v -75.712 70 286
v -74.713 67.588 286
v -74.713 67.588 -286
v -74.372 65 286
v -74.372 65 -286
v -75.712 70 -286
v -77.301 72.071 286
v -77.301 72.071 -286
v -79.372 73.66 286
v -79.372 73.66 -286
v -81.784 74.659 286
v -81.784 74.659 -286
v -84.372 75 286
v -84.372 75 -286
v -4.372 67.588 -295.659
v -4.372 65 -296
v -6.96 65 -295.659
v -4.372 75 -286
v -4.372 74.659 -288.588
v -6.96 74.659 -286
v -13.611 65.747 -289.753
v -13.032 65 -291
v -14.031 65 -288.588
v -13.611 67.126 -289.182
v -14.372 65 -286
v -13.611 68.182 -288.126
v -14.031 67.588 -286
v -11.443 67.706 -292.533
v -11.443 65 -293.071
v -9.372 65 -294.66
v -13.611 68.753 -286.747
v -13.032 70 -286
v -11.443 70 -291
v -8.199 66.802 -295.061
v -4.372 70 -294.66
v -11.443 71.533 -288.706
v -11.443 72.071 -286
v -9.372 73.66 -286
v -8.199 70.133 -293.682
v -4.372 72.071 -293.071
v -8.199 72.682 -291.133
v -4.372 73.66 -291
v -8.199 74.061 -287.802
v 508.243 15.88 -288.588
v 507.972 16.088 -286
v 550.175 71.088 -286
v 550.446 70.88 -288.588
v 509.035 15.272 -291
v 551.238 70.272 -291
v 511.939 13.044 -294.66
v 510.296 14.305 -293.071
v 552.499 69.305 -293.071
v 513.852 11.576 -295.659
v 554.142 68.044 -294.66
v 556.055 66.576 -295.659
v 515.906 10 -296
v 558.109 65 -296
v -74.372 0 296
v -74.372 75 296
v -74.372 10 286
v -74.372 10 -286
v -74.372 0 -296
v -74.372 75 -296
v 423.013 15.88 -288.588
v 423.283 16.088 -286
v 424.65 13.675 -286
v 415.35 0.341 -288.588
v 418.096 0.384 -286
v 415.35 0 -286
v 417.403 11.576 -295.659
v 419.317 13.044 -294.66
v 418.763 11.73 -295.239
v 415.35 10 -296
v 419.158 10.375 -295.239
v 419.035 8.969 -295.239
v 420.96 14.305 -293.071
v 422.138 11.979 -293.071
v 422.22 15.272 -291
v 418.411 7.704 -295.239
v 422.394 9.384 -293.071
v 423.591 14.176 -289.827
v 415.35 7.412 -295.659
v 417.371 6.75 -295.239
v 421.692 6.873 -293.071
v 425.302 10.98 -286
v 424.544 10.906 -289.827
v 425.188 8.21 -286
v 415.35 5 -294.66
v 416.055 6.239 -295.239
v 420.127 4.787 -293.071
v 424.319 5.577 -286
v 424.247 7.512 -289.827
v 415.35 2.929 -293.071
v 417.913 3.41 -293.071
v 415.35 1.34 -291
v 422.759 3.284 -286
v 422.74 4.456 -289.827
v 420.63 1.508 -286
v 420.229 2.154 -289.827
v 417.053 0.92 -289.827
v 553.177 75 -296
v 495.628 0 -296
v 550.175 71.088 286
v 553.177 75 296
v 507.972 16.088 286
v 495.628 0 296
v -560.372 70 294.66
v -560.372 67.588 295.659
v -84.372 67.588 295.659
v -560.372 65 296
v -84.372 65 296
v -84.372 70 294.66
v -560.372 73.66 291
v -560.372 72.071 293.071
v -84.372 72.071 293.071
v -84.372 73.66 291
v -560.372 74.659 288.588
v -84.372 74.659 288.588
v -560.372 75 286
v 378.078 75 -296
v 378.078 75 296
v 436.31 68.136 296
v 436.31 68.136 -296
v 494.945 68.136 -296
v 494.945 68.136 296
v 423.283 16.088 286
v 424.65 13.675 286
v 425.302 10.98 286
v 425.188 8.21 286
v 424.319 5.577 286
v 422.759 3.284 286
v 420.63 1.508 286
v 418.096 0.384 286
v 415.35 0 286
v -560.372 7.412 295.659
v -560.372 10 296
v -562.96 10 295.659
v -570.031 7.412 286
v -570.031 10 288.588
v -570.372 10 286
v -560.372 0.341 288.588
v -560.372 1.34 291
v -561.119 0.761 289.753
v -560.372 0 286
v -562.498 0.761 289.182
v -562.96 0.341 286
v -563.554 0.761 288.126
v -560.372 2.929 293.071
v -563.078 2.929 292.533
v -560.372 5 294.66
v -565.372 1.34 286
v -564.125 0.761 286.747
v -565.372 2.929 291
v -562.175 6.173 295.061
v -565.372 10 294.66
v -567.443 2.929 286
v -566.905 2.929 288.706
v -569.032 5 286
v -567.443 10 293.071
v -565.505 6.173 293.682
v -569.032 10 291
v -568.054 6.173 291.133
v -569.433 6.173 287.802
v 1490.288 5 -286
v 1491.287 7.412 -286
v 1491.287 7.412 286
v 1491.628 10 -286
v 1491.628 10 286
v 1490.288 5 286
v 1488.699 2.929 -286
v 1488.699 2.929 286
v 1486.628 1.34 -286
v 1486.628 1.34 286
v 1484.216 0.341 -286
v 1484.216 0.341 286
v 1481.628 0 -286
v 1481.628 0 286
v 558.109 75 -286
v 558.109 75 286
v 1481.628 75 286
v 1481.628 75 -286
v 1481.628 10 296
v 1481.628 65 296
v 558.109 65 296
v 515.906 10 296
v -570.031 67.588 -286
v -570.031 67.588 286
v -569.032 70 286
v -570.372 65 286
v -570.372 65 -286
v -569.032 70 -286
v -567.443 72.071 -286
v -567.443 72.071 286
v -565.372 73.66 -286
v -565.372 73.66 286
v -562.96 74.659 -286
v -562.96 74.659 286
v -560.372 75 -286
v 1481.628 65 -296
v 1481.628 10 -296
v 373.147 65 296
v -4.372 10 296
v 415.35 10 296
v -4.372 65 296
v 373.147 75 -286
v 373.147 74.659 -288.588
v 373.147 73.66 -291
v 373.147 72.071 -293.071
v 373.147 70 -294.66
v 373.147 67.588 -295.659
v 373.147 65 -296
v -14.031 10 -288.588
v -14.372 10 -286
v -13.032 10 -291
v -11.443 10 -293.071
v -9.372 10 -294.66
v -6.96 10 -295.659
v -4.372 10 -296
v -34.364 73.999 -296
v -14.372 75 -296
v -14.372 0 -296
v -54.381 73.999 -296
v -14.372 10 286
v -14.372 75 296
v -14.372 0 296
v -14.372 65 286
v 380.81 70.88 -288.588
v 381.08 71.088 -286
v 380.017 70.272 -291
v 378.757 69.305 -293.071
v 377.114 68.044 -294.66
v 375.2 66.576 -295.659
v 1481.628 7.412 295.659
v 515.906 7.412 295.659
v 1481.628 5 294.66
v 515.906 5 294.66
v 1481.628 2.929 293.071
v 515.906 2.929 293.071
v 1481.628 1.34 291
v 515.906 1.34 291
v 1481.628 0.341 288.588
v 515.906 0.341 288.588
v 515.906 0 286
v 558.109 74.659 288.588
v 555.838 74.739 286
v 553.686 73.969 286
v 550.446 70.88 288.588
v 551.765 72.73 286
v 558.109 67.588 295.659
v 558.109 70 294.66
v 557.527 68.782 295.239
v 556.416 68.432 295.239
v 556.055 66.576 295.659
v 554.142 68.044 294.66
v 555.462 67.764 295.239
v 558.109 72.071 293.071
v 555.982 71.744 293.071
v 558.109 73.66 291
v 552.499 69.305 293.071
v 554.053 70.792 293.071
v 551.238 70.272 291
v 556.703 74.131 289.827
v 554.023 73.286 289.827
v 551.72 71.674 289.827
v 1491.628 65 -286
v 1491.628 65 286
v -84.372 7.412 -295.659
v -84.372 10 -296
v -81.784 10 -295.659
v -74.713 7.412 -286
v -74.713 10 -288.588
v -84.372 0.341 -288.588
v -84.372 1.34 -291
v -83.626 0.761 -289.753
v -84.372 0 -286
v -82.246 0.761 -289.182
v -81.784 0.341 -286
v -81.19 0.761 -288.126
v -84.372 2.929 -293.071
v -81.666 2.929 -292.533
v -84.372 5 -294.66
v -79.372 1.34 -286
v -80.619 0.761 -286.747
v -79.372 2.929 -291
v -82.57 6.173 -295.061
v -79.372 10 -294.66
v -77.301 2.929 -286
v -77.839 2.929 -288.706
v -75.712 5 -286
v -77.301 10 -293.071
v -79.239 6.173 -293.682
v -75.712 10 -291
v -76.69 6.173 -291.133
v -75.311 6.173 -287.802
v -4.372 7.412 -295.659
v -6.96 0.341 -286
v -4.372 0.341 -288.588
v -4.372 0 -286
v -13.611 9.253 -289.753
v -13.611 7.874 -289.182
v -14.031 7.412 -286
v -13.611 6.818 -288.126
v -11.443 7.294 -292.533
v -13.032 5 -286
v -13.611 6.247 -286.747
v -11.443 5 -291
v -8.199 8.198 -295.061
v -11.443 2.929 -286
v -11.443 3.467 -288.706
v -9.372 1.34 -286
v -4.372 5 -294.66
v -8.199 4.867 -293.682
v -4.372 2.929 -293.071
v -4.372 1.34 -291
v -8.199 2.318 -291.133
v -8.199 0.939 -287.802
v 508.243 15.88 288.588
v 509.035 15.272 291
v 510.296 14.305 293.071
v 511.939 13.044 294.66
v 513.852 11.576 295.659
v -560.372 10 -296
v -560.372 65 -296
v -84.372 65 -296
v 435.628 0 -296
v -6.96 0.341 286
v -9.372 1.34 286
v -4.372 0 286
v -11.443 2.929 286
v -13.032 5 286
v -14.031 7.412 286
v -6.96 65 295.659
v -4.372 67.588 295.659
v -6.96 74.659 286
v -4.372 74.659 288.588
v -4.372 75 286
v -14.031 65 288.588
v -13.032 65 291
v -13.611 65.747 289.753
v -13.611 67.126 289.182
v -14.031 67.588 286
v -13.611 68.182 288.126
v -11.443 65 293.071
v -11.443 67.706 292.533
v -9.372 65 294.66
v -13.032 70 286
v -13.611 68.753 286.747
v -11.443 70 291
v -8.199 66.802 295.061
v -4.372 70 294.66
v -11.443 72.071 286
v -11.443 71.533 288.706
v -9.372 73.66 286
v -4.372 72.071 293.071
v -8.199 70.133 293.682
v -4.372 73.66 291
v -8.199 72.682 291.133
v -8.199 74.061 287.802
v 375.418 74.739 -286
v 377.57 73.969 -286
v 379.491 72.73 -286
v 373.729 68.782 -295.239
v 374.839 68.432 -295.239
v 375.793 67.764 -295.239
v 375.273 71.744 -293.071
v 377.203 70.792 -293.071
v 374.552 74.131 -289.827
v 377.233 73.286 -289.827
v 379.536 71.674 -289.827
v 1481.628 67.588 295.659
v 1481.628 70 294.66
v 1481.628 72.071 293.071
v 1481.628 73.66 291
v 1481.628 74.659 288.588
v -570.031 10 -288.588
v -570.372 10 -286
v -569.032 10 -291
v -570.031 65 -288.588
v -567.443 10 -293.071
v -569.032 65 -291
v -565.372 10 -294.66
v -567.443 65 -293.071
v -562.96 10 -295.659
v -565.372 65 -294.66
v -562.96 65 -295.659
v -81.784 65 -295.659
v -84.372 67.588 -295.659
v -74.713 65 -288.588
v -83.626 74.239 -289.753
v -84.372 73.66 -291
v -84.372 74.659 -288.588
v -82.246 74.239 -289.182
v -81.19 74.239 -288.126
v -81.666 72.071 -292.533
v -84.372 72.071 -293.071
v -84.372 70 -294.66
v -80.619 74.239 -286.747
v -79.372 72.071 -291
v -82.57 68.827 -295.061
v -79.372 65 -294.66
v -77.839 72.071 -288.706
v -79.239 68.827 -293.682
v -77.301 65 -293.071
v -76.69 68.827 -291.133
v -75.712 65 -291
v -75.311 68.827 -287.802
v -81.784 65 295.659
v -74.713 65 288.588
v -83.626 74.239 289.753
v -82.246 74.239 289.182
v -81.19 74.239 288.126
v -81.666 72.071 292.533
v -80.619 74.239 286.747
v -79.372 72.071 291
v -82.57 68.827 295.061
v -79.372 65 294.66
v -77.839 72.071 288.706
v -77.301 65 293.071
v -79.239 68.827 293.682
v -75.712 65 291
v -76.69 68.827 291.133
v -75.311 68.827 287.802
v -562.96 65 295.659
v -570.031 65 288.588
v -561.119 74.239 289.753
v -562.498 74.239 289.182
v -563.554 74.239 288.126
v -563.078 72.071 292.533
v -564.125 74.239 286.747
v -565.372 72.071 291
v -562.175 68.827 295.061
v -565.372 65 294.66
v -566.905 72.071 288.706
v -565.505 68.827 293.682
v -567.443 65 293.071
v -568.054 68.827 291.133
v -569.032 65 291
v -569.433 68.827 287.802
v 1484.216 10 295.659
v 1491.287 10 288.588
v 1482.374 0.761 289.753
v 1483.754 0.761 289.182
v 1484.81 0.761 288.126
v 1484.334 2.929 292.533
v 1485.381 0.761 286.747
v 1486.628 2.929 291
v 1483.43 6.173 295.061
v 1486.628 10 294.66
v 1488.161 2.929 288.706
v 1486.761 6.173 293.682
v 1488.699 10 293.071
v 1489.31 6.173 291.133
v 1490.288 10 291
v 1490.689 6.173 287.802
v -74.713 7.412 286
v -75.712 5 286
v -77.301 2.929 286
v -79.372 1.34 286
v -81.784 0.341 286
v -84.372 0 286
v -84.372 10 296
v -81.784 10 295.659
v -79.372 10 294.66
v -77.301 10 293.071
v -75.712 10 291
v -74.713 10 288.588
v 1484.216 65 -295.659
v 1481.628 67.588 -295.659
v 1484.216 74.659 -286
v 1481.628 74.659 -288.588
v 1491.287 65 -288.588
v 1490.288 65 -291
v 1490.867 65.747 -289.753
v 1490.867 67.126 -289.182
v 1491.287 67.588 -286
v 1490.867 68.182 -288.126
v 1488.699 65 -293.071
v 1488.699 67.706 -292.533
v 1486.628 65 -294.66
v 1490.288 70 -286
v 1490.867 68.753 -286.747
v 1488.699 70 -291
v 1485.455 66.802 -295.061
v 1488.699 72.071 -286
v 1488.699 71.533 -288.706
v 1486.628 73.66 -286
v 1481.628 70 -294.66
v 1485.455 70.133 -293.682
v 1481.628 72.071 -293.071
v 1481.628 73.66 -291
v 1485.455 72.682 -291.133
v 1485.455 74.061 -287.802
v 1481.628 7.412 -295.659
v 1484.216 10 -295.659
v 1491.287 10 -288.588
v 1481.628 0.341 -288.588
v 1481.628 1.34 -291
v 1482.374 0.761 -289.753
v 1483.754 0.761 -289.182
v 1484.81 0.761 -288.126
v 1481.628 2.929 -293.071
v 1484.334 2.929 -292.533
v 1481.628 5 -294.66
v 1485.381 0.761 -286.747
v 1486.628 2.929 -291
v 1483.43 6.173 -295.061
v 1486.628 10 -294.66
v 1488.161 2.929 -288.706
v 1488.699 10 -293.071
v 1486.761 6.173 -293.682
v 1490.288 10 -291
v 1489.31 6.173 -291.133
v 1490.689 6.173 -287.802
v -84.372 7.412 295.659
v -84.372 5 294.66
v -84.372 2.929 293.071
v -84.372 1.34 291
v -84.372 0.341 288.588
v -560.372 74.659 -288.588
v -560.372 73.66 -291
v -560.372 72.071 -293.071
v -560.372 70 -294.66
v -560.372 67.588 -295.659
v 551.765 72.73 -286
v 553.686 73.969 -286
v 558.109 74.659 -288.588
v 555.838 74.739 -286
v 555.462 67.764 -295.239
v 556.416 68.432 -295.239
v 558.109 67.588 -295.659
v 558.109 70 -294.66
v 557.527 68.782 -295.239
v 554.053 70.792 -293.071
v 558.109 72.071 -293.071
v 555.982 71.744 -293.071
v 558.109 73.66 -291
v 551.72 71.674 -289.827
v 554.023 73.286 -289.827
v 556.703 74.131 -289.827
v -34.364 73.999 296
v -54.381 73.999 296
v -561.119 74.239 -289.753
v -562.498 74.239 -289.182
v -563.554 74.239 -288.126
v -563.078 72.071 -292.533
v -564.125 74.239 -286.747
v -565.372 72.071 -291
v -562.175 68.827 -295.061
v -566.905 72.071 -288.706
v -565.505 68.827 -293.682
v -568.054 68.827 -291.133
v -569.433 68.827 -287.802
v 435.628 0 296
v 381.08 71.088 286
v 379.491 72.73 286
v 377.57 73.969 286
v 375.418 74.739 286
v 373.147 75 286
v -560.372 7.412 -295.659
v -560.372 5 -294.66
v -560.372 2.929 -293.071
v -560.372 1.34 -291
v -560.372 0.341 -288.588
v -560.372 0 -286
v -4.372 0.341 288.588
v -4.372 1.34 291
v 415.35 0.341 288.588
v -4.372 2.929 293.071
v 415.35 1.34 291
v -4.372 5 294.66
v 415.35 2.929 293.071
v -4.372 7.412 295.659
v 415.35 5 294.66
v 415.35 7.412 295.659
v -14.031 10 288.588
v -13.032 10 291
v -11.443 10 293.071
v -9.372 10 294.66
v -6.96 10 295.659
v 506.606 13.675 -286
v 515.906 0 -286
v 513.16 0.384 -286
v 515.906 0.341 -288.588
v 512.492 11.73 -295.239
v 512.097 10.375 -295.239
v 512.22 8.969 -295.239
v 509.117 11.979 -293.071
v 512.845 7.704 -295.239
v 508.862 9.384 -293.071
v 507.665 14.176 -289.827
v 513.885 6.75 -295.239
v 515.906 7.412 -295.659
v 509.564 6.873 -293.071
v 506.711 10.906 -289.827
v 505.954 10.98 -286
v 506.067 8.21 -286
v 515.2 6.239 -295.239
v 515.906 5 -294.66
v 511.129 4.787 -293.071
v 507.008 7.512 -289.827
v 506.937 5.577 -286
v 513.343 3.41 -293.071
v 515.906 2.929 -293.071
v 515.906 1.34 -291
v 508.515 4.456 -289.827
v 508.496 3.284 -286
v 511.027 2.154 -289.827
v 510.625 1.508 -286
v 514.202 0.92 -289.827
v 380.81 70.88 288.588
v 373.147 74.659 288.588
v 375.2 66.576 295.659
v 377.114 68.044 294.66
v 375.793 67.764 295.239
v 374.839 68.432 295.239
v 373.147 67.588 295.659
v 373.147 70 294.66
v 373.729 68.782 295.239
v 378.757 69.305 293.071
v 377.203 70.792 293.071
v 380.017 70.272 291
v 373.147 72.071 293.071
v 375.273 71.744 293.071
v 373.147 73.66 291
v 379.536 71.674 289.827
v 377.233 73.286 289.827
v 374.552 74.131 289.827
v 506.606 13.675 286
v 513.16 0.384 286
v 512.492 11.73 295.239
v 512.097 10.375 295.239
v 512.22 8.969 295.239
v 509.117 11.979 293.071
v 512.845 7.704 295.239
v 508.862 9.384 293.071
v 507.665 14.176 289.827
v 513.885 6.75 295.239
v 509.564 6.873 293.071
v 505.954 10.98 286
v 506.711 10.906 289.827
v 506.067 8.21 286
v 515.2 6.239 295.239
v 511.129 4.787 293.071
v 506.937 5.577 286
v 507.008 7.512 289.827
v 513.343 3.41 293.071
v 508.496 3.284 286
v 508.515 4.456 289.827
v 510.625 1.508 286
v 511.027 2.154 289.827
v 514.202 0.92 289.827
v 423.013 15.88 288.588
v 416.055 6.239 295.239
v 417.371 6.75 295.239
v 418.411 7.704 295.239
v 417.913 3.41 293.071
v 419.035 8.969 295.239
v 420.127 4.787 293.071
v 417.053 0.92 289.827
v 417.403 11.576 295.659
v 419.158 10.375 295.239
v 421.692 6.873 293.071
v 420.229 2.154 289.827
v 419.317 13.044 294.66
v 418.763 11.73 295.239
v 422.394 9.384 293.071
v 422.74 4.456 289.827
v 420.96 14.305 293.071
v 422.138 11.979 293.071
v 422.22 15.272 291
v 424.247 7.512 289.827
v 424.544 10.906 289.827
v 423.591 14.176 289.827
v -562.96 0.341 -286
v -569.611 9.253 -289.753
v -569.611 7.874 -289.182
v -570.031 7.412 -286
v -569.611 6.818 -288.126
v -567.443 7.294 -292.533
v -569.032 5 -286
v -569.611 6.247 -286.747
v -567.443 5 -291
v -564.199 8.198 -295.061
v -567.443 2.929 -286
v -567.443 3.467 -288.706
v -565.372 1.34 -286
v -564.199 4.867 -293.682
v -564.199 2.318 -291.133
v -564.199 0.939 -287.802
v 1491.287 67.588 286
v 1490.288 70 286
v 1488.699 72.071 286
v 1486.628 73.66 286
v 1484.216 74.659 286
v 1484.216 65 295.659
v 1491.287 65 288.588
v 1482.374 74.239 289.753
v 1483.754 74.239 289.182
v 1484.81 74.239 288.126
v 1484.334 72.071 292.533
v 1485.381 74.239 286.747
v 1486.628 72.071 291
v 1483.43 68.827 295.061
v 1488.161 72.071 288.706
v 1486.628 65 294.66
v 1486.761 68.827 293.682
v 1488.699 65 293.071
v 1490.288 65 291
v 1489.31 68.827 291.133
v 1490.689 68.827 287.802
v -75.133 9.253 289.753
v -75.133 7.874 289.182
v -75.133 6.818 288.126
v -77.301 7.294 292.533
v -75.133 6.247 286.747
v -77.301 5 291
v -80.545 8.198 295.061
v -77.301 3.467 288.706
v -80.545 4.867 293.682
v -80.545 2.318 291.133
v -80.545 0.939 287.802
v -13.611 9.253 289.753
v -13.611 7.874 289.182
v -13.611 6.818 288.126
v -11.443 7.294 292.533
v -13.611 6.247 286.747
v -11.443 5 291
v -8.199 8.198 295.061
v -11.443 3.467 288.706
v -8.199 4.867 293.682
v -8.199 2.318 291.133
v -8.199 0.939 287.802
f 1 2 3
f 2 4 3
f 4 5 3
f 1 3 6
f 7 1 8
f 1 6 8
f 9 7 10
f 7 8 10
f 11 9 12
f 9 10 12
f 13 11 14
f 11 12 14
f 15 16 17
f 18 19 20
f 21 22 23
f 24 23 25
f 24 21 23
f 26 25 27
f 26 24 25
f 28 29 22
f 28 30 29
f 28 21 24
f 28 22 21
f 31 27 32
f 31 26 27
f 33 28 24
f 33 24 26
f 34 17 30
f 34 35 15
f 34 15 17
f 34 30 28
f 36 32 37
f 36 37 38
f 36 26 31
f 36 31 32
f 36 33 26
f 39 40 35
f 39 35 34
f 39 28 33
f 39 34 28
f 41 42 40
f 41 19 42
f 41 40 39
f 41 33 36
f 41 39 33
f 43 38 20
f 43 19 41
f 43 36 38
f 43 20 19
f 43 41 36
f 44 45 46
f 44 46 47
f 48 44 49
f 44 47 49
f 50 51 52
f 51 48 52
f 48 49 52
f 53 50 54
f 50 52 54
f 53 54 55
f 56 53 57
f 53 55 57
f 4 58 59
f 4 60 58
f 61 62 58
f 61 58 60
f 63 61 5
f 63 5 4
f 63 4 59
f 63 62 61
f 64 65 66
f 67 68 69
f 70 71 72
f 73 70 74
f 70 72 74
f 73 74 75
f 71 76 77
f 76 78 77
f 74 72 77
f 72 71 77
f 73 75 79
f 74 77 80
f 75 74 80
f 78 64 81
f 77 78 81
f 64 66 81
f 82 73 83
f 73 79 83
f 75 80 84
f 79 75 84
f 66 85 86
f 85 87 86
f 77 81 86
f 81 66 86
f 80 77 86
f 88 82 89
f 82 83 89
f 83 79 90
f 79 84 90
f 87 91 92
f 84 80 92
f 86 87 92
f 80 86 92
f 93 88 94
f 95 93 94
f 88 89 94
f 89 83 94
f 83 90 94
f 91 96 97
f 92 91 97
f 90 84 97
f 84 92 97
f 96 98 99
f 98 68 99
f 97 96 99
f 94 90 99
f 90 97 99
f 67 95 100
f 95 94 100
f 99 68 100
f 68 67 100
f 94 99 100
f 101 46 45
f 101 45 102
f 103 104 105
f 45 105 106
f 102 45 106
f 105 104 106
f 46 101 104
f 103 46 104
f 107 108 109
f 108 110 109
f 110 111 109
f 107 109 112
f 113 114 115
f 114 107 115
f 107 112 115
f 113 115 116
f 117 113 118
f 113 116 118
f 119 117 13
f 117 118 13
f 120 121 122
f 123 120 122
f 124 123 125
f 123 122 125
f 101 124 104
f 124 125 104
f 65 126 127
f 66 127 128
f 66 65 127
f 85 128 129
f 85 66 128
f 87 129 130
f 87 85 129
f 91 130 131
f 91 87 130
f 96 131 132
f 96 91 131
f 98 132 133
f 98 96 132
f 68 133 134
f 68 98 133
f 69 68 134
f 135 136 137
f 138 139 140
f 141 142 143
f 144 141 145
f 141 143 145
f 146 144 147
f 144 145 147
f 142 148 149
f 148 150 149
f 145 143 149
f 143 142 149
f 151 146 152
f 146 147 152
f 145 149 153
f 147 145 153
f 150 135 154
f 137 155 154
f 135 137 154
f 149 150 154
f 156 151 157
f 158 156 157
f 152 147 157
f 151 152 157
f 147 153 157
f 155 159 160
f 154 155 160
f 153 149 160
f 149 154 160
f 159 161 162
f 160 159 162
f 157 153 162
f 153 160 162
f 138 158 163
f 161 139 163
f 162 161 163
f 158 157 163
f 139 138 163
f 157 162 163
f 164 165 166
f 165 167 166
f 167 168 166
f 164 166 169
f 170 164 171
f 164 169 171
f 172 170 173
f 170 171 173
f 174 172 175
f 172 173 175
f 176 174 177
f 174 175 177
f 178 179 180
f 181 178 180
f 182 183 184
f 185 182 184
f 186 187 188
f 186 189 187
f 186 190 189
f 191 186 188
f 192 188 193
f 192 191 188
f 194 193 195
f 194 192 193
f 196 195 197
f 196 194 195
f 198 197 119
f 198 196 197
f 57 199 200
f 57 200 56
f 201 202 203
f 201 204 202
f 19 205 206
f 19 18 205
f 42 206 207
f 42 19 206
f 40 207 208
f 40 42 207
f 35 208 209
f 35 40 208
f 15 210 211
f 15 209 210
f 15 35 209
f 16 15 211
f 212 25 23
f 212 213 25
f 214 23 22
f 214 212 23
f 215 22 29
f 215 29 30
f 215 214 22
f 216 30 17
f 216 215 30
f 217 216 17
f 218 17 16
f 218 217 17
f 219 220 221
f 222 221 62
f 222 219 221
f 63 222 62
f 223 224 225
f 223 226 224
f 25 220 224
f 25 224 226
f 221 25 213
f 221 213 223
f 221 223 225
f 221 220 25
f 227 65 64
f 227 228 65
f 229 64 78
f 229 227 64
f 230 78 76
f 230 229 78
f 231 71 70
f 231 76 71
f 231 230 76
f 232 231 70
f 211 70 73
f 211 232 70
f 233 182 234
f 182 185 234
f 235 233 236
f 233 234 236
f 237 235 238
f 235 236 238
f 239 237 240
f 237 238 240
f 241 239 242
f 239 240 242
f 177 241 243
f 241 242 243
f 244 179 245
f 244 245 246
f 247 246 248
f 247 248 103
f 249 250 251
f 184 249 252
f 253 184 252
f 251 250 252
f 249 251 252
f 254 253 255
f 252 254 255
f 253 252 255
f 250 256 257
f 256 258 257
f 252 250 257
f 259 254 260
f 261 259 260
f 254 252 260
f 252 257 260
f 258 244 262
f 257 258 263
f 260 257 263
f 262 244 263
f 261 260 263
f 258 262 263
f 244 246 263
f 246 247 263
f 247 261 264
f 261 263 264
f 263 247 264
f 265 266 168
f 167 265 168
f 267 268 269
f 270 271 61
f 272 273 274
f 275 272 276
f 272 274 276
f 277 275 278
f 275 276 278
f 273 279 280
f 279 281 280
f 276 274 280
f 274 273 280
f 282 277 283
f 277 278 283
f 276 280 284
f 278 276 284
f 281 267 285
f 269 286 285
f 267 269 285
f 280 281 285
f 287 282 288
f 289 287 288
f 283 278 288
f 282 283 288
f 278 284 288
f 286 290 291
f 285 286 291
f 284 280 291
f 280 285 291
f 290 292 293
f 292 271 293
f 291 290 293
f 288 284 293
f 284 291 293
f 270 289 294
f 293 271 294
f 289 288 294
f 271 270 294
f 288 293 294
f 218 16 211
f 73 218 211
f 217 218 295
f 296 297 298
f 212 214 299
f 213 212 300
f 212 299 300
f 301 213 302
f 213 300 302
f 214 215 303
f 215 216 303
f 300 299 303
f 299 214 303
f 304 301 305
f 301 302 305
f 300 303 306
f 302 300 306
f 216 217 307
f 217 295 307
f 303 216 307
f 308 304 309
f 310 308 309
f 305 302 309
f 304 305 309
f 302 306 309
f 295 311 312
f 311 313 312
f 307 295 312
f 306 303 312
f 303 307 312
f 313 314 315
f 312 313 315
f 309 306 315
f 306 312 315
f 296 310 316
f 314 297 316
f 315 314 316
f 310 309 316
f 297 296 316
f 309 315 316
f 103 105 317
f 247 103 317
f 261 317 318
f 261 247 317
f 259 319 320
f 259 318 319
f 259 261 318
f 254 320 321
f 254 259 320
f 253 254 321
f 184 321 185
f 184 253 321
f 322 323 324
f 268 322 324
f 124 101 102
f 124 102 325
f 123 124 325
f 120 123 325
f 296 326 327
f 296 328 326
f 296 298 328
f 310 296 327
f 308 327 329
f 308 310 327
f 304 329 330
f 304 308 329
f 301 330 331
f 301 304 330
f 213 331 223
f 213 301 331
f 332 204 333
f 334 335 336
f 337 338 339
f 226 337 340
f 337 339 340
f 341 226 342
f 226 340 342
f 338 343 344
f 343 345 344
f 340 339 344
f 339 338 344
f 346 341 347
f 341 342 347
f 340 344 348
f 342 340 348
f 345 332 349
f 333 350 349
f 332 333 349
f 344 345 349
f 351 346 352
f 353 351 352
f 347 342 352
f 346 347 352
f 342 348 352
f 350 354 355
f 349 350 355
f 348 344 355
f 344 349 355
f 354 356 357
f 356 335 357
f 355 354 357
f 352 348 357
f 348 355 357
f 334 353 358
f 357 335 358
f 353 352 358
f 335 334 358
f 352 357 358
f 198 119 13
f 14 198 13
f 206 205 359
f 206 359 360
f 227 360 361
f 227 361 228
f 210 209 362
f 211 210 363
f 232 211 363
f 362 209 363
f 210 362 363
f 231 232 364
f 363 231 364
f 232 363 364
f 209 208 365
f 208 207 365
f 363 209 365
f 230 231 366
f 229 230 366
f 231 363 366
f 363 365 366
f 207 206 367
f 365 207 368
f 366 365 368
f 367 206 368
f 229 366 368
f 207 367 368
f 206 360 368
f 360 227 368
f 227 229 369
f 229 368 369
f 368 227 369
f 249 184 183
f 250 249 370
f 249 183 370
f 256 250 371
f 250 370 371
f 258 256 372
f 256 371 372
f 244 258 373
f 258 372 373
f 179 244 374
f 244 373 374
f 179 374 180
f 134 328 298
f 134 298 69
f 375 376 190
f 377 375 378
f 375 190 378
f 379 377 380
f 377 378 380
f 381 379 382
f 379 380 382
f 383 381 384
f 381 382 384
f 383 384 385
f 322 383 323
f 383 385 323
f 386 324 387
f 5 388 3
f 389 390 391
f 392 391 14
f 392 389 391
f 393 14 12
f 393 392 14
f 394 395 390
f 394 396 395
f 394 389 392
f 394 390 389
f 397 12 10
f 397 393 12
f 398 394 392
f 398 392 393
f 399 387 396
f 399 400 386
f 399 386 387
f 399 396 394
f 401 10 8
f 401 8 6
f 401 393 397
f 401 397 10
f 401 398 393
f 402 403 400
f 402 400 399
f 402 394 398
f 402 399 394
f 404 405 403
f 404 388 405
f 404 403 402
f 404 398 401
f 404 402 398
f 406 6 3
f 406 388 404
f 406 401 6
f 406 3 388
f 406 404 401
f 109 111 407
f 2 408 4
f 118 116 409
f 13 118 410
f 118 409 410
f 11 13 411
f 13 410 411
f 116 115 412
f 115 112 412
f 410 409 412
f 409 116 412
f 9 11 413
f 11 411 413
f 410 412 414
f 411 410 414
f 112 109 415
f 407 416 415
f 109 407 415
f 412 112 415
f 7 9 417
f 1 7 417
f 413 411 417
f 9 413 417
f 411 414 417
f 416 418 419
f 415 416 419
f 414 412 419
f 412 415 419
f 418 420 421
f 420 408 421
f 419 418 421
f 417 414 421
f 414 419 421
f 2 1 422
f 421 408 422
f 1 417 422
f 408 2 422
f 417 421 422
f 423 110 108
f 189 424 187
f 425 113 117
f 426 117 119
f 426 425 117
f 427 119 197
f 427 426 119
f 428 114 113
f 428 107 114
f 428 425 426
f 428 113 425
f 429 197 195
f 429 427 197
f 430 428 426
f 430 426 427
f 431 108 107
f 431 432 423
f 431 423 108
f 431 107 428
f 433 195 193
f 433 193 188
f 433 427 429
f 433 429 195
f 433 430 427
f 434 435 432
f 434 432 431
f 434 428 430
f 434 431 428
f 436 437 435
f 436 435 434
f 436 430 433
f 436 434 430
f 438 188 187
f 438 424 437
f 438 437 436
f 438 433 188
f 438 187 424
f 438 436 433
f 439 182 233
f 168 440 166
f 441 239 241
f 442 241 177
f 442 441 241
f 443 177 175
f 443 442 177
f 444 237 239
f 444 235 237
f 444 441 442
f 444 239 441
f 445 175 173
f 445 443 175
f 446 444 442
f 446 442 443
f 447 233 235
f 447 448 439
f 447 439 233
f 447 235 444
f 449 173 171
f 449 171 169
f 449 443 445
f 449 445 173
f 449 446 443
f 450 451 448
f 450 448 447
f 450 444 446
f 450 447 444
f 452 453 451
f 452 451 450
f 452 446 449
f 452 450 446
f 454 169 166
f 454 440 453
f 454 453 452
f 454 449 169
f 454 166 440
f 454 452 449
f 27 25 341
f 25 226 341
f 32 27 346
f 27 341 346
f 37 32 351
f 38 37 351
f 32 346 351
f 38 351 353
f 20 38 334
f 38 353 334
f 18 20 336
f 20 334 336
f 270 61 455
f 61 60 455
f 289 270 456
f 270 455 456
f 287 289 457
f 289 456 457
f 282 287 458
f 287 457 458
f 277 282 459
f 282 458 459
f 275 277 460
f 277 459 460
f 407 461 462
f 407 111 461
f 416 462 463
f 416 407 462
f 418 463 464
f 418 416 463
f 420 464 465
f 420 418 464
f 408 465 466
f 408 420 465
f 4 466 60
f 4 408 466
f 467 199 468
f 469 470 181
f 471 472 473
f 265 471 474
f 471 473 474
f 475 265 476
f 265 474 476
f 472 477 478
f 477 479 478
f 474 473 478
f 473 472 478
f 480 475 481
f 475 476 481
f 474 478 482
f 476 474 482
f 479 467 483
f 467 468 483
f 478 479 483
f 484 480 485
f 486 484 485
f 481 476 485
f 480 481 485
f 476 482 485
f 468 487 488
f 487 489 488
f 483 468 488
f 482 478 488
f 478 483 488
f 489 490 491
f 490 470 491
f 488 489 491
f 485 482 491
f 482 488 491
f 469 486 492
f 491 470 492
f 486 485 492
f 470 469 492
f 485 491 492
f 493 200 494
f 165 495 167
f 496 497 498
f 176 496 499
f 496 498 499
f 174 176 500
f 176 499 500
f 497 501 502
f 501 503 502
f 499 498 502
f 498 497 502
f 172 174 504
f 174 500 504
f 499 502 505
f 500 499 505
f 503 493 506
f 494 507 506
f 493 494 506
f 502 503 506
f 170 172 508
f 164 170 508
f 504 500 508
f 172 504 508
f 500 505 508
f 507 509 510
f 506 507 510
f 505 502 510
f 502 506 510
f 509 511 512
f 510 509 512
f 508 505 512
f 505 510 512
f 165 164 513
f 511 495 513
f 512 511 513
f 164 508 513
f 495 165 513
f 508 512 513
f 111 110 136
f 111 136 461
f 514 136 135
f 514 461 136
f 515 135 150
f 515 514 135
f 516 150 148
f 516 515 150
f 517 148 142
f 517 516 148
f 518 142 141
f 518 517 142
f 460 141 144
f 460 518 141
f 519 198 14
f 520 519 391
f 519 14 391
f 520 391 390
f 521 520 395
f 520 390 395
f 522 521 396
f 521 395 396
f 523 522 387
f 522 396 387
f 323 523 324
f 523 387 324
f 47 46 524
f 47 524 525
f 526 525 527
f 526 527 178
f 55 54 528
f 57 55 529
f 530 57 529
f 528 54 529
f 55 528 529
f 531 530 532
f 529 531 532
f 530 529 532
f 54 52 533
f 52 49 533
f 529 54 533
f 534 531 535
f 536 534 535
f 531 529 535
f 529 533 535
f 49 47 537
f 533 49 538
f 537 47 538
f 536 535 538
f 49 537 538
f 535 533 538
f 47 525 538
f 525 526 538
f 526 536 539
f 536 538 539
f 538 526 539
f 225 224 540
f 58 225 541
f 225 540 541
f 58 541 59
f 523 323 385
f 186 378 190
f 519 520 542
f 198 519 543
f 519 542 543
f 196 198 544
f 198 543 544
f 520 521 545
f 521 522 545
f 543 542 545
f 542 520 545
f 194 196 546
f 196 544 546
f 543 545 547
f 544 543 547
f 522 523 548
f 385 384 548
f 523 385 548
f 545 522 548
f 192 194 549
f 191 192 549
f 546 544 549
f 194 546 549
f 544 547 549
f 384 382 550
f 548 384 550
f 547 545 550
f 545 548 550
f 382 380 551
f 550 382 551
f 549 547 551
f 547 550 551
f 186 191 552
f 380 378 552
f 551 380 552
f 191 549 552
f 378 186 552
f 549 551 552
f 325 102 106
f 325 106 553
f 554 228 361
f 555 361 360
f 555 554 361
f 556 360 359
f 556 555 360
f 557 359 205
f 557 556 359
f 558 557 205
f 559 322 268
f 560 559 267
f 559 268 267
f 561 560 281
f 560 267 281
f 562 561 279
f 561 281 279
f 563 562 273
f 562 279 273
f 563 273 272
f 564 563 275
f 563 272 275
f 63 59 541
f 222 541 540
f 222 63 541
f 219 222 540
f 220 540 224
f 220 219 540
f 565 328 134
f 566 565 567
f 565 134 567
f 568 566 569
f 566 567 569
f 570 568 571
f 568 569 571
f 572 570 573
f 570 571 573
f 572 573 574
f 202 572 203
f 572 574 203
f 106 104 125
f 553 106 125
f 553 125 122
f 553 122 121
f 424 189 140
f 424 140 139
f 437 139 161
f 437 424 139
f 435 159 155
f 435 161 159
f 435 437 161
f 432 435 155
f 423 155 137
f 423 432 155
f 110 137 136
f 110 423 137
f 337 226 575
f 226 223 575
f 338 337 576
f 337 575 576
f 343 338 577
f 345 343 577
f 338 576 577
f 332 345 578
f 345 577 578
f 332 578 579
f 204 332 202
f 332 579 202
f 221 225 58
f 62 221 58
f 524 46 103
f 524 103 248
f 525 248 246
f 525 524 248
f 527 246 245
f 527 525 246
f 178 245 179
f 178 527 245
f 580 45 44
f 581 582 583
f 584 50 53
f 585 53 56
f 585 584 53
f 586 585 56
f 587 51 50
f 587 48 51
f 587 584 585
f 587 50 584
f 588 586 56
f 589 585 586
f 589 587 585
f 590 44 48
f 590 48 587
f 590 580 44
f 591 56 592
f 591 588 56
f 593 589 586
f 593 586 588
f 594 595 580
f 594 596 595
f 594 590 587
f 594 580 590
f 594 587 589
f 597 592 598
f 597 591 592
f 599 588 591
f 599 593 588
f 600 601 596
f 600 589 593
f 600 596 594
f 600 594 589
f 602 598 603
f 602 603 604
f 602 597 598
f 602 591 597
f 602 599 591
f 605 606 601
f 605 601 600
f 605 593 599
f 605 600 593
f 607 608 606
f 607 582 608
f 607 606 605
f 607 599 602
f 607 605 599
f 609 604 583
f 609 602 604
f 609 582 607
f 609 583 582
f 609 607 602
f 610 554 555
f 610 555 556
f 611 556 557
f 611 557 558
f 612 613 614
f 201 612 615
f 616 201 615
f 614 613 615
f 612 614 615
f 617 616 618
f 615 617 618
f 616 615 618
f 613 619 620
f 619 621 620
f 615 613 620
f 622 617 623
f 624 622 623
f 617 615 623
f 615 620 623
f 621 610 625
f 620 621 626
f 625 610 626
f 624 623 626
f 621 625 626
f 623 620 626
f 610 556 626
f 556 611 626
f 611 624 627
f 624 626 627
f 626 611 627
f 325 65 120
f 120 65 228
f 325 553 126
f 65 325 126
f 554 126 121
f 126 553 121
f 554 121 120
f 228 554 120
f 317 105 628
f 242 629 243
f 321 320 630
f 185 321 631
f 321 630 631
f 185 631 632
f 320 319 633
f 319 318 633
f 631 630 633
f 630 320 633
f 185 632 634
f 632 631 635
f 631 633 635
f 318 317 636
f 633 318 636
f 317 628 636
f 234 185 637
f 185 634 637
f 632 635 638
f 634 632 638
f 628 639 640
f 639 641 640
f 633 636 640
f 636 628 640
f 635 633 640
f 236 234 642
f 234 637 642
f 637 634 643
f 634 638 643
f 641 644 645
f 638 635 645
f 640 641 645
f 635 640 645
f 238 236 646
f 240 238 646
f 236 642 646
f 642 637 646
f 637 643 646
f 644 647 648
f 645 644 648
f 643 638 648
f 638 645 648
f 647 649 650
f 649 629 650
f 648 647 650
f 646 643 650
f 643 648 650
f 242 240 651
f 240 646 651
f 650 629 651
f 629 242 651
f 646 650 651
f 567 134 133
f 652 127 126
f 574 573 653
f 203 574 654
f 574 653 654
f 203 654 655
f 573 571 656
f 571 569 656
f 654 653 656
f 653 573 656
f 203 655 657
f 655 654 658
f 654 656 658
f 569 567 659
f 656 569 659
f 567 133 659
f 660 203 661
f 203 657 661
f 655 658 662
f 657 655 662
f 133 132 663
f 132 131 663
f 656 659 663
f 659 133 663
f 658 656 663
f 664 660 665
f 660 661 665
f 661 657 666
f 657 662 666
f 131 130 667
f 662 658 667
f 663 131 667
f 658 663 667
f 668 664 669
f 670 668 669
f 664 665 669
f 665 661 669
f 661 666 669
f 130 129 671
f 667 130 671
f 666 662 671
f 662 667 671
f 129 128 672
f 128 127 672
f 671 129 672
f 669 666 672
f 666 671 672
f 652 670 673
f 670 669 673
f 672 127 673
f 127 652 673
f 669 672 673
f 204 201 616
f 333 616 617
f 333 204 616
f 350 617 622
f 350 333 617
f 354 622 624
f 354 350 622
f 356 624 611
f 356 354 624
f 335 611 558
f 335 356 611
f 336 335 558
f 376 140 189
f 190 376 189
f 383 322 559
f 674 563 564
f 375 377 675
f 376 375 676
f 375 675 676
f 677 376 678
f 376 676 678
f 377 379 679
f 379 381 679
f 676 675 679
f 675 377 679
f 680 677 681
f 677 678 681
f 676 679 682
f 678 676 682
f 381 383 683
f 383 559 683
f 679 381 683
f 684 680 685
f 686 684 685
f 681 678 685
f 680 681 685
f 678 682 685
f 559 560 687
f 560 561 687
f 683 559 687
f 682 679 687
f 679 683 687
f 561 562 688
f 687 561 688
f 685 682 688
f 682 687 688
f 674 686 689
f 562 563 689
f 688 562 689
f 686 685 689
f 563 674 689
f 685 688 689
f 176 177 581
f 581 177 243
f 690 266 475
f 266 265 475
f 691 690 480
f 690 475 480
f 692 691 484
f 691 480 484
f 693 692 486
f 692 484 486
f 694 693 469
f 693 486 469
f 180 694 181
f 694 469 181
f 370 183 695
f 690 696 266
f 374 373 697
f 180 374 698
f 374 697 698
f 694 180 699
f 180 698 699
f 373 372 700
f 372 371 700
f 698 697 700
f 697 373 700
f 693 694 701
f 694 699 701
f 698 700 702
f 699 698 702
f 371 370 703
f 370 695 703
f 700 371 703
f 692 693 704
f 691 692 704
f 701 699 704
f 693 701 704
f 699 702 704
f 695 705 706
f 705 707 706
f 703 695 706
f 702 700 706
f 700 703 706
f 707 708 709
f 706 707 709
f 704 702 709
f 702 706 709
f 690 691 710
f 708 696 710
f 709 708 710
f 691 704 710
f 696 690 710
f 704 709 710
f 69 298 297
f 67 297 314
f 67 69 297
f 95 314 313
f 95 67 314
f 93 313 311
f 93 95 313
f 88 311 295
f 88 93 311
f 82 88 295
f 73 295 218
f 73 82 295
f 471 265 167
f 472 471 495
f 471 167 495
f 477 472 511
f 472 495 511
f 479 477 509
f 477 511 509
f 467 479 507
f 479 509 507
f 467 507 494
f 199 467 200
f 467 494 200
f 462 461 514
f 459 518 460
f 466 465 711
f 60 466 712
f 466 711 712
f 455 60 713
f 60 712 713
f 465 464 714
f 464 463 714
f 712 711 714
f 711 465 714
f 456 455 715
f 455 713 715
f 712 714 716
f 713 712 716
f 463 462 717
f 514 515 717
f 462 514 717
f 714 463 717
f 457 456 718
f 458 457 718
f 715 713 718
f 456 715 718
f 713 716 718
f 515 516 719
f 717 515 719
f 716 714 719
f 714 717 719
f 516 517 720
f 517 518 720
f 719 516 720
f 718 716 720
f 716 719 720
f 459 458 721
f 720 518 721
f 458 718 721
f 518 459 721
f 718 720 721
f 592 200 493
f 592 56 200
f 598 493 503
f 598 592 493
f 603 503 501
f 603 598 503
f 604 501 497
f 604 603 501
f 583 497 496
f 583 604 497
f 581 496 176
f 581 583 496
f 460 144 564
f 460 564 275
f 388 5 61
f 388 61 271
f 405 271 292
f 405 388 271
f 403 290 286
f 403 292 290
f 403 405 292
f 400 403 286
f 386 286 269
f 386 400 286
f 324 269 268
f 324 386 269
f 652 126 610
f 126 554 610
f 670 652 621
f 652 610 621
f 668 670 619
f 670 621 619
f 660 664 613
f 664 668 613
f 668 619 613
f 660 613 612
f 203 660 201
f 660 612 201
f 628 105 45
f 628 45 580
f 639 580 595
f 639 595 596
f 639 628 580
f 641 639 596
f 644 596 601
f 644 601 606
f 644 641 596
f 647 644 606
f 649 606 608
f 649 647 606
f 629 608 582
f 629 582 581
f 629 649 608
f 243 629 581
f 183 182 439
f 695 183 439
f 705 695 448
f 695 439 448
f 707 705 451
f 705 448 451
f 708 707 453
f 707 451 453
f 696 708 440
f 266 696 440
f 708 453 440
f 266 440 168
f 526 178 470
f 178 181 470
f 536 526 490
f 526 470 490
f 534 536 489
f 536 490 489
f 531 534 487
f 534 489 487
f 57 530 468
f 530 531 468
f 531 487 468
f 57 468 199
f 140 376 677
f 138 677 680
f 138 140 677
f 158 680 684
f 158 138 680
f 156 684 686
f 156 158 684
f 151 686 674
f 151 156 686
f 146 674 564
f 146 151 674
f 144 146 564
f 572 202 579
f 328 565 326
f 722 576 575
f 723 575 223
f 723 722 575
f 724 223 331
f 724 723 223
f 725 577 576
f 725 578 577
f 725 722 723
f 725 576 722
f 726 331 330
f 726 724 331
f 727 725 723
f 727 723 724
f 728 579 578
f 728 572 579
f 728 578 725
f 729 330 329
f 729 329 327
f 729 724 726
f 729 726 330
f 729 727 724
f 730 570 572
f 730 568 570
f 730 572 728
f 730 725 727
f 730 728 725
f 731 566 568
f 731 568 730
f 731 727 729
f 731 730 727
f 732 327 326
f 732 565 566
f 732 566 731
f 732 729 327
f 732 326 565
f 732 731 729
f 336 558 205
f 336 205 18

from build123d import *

# Parameters (mm, degrees)
BOSS_EXTRUDE1_DEPTH   = 296
BOSS_EXTRUDE1_2_DEPTH = 296
SKETCH1_W             = 496
SKETCH1_H             = 75
BOSS_EXTRUDE1_3_DEPTH = 296
FILLET1_R             = 10
FILLET2_R             = 10
FILLET3_R             = 10
BOSS_EXTRUDE2_DEPTH   = 296


with BuildPart() as part:
    # Sketch1 → Boss-Extrude1 (new, symmetric)
    with BuildSketch(Plane.XY):
        Polygon((553.177330143, 75), (495.627806045, 0), (1491.627806045, 0), (1491.627806045, 75), align=None)
    extrude(amount=BOSS_EXTRUDE1_DEPTH, both=True)

    # Fillet1
    fillet1_edges = [part.edges().sort_by_distance(p)[0] for p in [
        (524.402568094, 37.5, 296),
        (495.627806045, 0, 0),
        (993.627806045, 0, 296),
        (1491.627806045, 0, 0),
        (1491.627806045, 37.5, 296),
        (1491.627806045, 37.5, -296),
        (524.402568094, 37.5, -296),
        (993.627806045, 0, -296),
        (1491.627806045, 75, 0),
        (1022.402568094, 75, 296),
        (553.177330143, 75, 0),
        (1022.402568094, 75, -296),
    ]]
    fillet(fillet1_edges, radius=FILLET1_R)



with BuildPart() as body_2:
    # Sketch1 → Boss-Extrude1 2 (new, symmetric)
    with BuildSketch(Plane.XY):
        Polygon((-14.372193955, 0), (435.627806045, 0), (378.078281946, 75), (-14.372193955, 75), align=None)
    extrude(amount=BOSS_EXTRUDE1_2_DEPTH, both=True)

    # Fillet2
    fillet2_edges = [body_2.edges().sort_by_distance(p)[0] for p in [
        (181.853043996, 75, 296),
        (181.853043996, 75, -296),
        (406.853043996, 37.5, 296),
        (210.627806045, 0, 296),
        (-14.372193955, 37.5, 296),
        (210.627806045, 0, -296),
        (406.853043996, 37.5, -296),
        (-14.372193955, 37.5, -296),
        (378.078281946, 75, 0),
        (-14.372193955, 75, 0),
        (-14.372193955, 0, 0),
        (435.627806045, 0, 0),
    ]]
    fillet(fillet2_edges, radius=FILLET2_R)


with BuildPart() as body_3:
    # Sketch1 → Boss-Extrude1 3 (new, symmetric)
    with BuildSketch(Plane.XY):
        with Locations((-322.372193955, 37.5)):
            Rectangle(SKETCH1_W, SKETCH1_H)
    extrude(amount=BOSS_EXTRUDE1_3_DEPTH, both=True)

    # Fillet3
    fillet3_edges = [body_3.edges().sort_by_distance(p)[0] for p in [
        (-74.372193955, 37.5, -296),
        (-570.372193955, 37.5, -296),
        (-570.372193955, 0, 0),
        (-74.372193955, 0, 0),
        (-322.372193955, 0, -296),
        (-74.372193955, 37.5, 296),
        (-322.372193955, 0, 296),
        (-570.372193955, 37.5, 296),
        (-74.372193955, 75, 0),
        (-322.372193955, 75, 296),
        (-570.372193955, 75, 0),
        (-322.372193955, 75, -296),
    ]]
    fillet(fillet3_edges, radius=FILLET3_R)


with BuildPart() as part_1:
    add(part.part)

    add(body_2.part)  # Boss-Extrude2 merges body 2

    add(body_3.part)  # Boss-Extrude2 merges body 3
    # Sketch1<3> → Boss-Extrude2 (add, symmetric)
    with BuildSketch(Plane.XY):
        with BuildLine():
            Line((435.627806045, 0), (495.627806045, 0))
            Line((495.627806045, 0), (553.177330143, 75))
            ThreePointArc((553.177330143, 75), (465.627806045, 67.275411564), (378.078281946, 75))
            Line((378.078281946, 75), (435.627806045, 0))
        make_face()
        with BuildLine():
            Line((-74.372193955, 0), (-14.372193955, 0))
            Line((-14.372193955, 0), (-14.372193955, 75))
            ThreePointArc((-14.372193955, 75), (-44.372193955, 73.873413504), (-74.372193955, 75))
            Line((-74.372193955, 75), (-74.372193955, 0))
        make_face()
    extrude(amount=BOSS_EXTRUDE2_DEPTH, both=True)


solid = part_1.part
